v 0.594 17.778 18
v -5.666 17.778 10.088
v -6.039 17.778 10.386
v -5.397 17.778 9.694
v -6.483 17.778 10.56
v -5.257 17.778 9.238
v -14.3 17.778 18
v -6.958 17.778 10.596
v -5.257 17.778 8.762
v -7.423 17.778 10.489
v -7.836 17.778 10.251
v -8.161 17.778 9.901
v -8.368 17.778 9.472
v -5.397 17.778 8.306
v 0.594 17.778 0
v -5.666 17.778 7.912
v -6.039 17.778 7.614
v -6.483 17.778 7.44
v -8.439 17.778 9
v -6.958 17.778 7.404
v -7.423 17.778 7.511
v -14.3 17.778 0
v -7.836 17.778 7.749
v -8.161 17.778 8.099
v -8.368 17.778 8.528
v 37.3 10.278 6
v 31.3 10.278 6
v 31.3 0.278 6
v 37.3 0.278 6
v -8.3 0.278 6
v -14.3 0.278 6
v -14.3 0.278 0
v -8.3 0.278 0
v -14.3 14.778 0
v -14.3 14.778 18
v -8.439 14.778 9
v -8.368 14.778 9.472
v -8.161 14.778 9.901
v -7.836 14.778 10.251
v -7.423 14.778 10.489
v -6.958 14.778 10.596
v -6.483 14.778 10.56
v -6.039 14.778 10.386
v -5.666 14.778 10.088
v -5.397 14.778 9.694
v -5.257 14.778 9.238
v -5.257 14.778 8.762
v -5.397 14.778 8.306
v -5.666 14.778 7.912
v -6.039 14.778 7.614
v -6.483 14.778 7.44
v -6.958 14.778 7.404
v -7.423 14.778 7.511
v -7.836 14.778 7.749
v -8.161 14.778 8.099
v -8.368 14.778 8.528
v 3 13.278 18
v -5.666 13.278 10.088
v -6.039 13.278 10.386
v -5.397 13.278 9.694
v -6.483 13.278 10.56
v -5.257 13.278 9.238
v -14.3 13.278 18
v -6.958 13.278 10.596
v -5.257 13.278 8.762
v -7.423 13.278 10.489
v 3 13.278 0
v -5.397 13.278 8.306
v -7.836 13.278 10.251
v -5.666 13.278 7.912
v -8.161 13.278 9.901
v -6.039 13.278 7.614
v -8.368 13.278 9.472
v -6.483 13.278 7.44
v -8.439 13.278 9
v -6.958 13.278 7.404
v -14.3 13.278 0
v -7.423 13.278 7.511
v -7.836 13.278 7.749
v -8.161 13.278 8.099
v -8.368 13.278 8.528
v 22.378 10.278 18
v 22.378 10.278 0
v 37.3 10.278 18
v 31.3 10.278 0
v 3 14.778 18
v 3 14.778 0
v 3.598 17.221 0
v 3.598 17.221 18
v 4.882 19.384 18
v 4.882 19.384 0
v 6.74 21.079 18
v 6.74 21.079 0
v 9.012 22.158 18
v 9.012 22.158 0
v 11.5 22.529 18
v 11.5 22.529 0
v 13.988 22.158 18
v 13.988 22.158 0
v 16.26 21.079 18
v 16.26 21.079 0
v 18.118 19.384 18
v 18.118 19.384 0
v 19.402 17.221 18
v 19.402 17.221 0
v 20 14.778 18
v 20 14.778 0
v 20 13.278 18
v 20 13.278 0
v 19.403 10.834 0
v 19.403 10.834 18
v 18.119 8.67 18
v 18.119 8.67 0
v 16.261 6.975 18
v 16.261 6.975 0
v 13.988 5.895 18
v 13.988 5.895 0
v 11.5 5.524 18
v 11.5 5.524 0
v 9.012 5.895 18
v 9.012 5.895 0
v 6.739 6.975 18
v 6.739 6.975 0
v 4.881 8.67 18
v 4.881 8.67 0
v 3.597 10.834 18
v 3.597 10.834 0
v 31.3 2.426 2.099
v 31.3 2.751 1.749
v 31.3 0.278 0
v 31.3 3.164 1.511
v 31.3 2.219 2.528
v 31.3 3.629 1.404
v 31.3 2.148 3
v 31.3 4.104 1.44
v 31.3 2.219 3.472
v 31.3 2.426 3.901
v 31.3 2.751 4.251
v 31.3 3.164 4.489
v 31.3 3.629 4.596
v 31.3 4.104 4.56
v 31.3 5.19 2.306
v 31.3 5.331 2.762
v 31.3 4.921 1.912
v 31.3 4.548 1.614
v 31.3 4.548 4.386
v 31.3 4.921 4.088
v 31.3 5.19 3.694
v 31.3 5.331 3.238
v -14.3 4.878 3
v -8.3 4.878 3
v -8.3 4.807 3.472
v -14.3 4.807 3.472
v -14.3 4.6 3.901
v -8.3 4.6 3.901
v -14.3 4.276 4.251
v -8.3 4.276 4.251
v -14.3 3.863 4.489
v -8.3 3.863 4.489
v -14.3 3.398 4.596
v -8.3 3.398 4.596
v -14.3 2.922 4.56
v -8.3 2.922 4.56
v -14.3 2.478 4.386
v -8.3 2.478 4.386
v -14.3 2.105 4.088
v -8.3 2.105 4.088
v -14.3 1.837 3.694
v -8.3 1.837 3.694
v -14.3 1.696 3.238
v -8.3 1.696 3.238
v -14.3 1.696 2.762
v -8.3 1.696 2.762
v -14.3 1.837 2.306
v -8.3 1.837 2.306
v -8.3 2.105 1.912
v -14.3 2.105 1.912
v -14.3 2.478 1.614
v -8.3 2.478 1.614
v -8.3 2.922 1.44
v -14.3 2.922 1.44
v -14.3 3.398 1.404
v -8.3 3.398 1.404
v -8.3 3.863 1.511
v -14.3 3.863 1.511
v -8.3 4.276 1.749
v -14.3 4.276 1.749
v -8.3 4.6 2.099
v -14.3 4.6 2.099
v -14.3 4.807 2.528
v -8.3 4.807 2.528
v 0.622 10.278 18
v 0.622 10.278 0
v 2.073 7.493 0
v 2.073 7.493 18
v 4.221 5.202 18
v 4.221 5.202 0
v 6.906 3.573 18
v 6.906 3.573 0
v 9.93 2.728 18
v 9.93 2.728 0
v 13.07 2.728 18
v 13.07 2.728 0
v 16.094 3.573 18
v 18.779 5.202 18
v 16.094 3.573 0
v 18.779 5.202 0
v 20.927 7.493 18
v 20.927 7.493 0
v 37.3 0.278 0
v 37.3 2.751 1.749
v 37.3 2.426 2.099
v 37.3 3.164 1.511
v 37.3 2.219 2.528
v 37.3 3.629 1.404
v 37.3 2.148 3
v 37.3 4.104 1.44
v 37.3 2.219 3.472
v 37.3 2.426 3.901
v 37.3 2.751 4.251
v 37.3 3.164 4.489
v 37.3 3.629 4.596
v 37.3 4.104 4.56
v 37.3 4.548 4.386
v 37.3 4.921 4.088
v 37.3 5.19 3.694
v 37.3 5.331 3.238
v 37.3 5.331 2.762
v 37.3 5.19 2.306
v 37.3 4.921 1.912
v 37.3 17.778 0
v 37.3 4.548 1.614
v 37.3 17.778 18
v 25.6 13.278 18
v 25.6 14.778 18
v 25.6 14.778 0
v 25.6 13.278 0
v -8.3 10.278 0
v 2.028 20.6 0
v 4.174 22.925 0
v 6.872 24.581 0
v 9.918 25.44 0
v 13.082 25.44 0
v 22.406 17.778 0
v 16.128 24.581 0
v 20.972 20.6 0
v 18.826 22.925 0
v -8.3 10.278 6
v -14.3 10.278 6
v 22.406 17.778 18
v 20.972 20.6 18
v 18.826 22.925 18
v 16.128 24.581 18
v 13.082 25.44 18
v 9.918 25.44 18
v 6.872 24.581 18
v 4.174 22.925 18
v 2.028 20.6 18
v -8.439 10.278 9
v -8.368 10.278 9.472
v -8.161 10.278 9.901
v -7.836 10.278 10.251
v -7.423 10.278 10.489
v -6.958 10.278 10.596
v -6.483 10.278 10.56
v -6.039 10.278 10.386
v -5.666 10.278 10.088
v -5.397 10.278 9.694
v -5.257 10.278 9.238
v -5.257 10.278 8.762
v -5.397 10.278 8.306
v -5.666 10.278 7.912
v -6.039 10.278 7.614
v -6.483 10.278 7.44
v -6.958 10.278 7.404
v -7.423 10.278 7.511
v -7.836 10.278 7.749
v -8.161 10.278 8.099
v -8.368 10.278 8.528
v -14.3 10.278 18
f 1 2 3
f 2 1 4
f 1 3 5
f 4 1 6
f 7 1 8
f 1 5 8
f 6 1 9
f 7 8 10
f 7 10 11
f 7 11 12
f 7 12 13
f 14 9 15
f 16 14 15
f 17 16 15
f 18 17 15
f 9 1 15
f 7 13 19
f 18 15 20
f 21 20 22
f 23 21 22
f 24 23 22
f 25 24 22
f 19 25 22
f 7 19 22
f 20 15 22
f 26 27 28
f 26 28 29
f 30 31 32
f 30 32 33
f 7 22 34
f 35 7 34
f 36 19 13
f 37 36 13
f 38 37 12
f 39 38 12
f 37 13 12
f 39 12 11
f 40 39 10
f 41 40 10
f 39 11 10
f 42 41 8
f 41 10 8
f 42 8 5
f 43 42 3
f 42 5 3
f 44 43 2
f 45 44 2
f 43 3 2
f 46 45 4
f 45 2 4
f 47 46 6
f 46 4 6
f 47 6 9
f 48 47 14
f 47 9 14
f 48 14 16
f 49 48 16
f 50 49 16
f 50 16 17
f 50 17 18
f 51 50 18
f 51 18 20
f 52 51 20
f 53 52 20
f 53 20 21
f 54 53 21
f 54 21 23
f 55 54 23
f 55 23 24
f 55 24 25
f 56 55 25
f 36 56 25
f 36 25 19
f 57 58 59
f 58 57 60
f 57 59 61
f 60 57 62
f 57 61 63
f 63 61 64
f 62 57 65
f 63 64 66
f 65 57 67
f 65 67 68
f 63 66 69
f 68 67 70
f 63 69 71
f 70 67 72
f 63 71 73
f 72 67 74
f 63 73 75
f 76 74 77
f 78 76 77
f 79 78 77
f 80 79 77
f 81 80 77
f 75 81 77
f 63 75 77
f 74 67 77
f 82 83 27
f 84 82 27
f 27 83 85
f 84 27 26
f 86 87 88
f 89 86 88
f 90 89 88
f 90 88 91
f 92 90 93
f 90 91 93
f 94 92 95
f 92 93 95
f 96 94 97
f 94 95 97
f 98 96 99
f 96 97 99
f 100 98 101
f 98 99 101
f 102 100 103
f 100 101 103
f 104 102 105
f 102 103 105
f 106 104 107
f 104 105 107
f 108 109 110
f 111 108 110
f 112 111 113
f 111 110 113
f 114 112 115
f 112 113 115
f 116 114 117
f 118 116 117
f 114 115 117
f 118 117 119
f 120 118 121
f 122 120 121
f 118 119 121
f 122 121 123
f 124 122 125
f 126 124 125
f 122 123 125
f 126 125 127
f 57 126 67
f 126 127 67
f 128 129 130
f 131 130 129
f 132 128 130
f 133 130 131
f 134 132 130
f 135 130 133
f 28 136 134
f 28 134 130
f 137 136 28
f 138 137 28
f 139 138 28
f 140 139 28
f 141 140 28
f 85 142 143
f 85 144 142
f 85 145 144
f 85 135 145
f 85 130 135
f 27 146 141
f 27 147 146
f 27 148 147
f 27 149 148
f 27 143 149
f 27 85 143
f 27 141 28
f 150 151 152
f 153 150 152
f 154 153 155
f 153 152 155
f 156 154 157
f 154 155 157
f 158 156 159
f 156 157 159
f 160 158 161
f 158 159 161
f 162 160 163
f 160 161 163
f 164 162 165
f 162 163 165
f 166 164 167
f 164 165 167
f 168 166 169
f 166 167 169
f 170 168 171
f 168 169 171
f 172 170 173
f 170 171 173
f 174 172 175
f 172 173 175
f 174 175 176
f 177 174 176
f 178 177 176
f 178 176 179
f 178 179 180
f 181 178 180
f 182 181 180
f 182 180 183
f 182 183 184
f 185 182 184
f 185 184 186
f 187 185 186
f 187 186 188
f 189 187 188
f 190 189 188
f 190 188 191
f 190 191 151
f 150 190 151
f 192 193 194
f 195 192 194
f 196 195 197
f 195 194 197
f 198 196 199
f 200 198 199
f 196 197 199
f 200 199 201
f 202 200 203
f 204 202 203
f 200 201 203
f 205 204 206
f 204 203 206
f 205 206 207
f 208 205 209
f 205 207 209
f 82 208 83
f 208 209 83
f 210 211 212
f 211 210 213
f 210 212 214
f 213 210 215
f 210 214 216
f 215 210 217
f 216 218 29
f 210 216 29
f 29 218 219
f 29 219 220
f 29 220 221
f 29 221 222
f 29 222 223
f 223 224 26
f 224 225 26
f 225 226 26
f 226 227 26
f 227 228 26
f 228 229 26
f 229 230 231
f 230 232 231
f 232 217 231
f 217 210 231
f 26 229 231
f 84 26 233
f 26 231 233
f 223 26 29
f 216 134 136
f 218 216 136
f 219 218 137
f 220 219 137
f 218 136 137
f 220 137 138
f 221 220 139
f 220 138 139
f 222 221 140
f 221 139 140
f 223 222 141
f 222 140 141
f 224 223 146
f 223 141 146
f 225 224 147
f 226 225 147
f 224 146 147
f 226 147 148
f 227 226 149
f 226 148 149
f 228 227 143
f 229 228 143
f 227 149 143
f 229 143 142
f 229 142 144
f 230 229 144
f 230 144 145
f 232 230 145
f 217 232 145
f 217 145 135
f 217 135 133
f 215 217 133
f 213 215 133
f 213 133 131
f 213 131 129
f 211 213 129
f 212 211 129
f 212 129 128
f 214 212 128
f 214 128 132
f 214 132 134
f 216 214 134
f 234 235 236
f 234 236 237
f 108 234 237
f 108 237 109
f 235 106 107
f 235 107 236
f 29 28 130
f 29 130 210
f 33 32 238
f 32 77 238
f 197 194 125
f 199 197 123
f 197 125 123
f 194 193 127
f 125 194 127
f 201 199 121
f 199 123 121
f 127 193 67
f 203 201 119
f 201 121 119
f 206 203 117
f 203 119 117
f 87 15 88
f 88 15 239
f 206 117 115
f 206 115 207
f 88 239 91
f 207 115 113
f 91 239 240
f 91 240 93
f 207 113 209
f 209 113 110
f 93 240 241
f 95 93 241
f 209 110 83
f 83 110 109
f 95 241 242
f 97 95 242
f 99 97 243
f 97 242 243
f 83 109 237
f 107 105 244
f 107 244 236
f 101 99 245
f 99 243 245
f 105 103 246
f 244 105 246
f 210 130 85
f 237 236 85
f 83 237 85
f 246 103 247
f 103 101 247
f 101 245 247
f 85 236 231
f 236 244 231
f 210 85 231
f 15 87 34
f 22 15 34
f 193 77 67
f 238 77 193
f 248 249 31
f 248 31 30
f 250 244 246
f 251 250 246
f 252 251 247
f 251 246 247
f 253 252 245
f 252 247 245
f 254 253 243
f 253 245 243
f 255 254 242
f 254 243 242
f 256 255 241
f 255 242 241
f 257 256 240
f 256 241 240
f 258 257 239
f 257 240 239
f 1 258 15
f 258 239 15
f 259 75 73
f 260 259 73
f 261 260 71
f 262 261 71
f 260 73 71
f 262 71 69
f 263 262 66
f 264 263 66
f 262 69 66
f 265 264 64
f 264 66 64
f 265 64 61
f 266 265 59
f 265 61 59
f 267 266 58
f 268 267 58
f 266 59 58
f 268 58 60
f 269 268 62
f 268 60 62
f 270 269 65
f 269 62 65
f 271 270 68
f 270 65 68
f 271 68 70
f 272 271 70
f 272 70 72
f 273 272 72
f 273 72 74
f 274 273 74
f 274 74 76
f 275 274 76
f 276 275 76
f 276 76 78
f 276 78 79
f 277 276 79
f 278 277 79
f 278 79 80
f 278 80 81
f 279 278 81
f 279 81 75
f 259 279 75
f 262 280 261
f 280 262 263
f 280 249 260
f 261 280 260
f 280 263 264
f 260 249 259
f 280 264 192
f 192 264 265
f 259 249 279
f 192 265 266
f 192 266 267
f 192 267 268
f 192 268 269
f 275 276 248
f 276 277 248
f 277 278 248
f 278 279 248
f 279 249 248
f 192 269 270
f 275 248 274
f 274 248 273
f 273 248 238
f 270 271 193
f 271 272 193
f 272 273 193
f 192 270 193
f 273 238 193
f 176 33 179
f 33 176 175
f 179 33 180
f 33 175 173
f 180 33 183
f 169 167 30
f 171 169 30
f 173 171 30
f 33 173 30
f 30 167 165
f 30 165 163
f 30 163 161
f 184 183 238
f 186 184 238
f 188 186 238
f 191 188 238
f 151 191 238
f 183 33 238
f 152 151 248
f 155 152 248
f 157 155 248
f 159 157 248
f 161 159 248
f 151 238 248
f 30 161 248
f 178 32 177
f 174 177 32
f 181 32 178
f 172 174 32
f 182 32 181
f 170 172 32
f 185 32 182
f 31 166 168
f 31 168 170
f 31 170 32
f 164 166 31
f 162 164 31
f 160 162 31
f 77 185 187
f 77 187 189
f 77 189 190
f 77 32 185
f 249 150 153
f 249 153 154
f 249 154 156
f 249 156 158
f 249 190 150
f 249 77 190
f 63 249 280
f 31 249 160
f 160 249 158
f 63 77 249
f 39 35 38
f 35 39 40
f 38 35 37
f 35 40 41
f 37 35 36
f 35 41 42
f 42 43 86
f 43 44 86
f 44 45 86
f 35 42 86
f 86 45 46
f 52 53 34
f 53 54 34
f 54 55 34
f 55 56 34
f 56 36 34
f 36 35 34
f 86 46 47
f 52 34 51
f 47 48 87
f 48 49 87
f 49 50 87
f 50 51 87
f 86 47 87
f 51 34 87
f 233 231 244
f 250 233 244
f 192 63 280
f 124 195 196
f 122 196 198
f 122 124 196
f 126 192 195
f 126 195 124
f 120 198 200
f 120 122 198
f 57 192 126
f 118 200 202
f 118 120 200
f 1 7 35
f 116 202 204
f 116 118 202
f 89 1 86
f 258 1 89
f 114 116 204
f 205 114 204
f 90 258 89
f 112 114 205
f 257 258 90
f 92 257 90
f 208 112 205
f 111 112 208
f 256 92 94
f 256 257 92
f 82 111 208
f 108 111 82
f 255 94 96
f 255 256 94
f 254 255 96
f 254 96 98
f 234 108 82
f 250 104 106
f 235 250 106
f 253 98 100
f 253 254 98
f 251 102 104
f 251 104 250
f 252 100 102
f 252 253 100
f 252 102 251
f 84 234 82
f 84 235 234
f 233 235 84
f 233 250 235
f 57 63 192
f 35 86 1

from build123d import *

# Parameters (mm, degrees)
F1_DEPTH  = 18
F3_D      = 3.2
F3_DEPTH  = 15
F4_W      = 6
F4_H      = 6
F5_DEPTH  = 10
F6_W      = 6
F6_H      = 6
F7_DEPTH  = 10
F9_D      = 3.2
F9_DEPTH  = 6
F11_D     = 3.2
F11_DEPTH = 6


with BuildPart() as f1:
    # F0 (on Top) → F1 (new body)
    with BuildSketch(Plane.XY):
        with BuildLine():
            Line((3, 13.278079), (-14.3, 13.278079))
            Line((-14.3, 13.278079), (-14.3, 10.278079))
            Line((-14.3, 10.278079), (0.622289, 10.278079))
            ThreePointArc((0.622289, 10.278079), (11.5, 2.620549), (22.377711, 10.278079))
            Line((22.377711, 10.278079), (23, 10.278079))
            Line((23, 10.278079), (37.3, 10.278079))
            Line((37.3, 10.278079), (37.3, 17.778079))
            Line((37.3, 17.778079), (22.406277, 17.778079))
            ThreePointArc((22.406277, 17.778079), (11.5, 25.549511), (0.593723, 17.778079))
            Line((0.593723, 17.778079), (-14.3, 17.778079))
            Line((-14.3, 17.778079), (-14.3, 14.778079))
            Line((-14.3, 14.778079), (3, 14.778079))
            ThreePointArc((3, 14.778079), (11.5, 22.528734), (20, 14.778079))
            Line((20, 14.778079), (25.6, 14.778079))
            Line((25.6, 14.778079), (25.6, 13.278079))
            Line((25.6, 13.278079), (23, 13.278079))
            Line((23, 13.278079), (20, 13.278079))
            ThreePointArc((20, 13.278079), (11.5, 5.523889), (3, 13.278079))
        make_face()
    extrude(amount=F1_DEPTH)

    # F3
    with Locations(Plane.XZ.offset(-10.278079)):
        with Locations((-6.838855, 9)):
            Hole(F3_D / 2, depth=F3_DEPTH)

    # F4 (on face) → F5 (join)
    with BuildSketch(Plane.XZ.offset(-10.278079)):
        with Locations((34.3, 3)):
            Rectangle(F4_W, F4_H)
    extrude(amount=F5_DEPTH)

    # F6 (on face) → F7 (join)
    with BuildSketch(Plane.XZ.offset(-10.278079)):
        with Locations((-11.3, 3)):
            Rectangle(F6_W, F6_H)
    extrude(amount=F7_DEPTH)

    # F9
    with Locations(Plane.YZ.offset(37.3)):
        with Locations((3.748374, 3)):
            Hole(F9_D / 2, depth=F9_DEPTH)

    # F11
    with Locations(Plane(origin=(-14.3, 0, 0), x_dir=(0, -1, 0), z_dir=(-1, 0, 0))):
        with Locations((-3.278079, 3)):
            Hole(F11_D / 2, depth=F11_DEPTH)


solid = f1.part
